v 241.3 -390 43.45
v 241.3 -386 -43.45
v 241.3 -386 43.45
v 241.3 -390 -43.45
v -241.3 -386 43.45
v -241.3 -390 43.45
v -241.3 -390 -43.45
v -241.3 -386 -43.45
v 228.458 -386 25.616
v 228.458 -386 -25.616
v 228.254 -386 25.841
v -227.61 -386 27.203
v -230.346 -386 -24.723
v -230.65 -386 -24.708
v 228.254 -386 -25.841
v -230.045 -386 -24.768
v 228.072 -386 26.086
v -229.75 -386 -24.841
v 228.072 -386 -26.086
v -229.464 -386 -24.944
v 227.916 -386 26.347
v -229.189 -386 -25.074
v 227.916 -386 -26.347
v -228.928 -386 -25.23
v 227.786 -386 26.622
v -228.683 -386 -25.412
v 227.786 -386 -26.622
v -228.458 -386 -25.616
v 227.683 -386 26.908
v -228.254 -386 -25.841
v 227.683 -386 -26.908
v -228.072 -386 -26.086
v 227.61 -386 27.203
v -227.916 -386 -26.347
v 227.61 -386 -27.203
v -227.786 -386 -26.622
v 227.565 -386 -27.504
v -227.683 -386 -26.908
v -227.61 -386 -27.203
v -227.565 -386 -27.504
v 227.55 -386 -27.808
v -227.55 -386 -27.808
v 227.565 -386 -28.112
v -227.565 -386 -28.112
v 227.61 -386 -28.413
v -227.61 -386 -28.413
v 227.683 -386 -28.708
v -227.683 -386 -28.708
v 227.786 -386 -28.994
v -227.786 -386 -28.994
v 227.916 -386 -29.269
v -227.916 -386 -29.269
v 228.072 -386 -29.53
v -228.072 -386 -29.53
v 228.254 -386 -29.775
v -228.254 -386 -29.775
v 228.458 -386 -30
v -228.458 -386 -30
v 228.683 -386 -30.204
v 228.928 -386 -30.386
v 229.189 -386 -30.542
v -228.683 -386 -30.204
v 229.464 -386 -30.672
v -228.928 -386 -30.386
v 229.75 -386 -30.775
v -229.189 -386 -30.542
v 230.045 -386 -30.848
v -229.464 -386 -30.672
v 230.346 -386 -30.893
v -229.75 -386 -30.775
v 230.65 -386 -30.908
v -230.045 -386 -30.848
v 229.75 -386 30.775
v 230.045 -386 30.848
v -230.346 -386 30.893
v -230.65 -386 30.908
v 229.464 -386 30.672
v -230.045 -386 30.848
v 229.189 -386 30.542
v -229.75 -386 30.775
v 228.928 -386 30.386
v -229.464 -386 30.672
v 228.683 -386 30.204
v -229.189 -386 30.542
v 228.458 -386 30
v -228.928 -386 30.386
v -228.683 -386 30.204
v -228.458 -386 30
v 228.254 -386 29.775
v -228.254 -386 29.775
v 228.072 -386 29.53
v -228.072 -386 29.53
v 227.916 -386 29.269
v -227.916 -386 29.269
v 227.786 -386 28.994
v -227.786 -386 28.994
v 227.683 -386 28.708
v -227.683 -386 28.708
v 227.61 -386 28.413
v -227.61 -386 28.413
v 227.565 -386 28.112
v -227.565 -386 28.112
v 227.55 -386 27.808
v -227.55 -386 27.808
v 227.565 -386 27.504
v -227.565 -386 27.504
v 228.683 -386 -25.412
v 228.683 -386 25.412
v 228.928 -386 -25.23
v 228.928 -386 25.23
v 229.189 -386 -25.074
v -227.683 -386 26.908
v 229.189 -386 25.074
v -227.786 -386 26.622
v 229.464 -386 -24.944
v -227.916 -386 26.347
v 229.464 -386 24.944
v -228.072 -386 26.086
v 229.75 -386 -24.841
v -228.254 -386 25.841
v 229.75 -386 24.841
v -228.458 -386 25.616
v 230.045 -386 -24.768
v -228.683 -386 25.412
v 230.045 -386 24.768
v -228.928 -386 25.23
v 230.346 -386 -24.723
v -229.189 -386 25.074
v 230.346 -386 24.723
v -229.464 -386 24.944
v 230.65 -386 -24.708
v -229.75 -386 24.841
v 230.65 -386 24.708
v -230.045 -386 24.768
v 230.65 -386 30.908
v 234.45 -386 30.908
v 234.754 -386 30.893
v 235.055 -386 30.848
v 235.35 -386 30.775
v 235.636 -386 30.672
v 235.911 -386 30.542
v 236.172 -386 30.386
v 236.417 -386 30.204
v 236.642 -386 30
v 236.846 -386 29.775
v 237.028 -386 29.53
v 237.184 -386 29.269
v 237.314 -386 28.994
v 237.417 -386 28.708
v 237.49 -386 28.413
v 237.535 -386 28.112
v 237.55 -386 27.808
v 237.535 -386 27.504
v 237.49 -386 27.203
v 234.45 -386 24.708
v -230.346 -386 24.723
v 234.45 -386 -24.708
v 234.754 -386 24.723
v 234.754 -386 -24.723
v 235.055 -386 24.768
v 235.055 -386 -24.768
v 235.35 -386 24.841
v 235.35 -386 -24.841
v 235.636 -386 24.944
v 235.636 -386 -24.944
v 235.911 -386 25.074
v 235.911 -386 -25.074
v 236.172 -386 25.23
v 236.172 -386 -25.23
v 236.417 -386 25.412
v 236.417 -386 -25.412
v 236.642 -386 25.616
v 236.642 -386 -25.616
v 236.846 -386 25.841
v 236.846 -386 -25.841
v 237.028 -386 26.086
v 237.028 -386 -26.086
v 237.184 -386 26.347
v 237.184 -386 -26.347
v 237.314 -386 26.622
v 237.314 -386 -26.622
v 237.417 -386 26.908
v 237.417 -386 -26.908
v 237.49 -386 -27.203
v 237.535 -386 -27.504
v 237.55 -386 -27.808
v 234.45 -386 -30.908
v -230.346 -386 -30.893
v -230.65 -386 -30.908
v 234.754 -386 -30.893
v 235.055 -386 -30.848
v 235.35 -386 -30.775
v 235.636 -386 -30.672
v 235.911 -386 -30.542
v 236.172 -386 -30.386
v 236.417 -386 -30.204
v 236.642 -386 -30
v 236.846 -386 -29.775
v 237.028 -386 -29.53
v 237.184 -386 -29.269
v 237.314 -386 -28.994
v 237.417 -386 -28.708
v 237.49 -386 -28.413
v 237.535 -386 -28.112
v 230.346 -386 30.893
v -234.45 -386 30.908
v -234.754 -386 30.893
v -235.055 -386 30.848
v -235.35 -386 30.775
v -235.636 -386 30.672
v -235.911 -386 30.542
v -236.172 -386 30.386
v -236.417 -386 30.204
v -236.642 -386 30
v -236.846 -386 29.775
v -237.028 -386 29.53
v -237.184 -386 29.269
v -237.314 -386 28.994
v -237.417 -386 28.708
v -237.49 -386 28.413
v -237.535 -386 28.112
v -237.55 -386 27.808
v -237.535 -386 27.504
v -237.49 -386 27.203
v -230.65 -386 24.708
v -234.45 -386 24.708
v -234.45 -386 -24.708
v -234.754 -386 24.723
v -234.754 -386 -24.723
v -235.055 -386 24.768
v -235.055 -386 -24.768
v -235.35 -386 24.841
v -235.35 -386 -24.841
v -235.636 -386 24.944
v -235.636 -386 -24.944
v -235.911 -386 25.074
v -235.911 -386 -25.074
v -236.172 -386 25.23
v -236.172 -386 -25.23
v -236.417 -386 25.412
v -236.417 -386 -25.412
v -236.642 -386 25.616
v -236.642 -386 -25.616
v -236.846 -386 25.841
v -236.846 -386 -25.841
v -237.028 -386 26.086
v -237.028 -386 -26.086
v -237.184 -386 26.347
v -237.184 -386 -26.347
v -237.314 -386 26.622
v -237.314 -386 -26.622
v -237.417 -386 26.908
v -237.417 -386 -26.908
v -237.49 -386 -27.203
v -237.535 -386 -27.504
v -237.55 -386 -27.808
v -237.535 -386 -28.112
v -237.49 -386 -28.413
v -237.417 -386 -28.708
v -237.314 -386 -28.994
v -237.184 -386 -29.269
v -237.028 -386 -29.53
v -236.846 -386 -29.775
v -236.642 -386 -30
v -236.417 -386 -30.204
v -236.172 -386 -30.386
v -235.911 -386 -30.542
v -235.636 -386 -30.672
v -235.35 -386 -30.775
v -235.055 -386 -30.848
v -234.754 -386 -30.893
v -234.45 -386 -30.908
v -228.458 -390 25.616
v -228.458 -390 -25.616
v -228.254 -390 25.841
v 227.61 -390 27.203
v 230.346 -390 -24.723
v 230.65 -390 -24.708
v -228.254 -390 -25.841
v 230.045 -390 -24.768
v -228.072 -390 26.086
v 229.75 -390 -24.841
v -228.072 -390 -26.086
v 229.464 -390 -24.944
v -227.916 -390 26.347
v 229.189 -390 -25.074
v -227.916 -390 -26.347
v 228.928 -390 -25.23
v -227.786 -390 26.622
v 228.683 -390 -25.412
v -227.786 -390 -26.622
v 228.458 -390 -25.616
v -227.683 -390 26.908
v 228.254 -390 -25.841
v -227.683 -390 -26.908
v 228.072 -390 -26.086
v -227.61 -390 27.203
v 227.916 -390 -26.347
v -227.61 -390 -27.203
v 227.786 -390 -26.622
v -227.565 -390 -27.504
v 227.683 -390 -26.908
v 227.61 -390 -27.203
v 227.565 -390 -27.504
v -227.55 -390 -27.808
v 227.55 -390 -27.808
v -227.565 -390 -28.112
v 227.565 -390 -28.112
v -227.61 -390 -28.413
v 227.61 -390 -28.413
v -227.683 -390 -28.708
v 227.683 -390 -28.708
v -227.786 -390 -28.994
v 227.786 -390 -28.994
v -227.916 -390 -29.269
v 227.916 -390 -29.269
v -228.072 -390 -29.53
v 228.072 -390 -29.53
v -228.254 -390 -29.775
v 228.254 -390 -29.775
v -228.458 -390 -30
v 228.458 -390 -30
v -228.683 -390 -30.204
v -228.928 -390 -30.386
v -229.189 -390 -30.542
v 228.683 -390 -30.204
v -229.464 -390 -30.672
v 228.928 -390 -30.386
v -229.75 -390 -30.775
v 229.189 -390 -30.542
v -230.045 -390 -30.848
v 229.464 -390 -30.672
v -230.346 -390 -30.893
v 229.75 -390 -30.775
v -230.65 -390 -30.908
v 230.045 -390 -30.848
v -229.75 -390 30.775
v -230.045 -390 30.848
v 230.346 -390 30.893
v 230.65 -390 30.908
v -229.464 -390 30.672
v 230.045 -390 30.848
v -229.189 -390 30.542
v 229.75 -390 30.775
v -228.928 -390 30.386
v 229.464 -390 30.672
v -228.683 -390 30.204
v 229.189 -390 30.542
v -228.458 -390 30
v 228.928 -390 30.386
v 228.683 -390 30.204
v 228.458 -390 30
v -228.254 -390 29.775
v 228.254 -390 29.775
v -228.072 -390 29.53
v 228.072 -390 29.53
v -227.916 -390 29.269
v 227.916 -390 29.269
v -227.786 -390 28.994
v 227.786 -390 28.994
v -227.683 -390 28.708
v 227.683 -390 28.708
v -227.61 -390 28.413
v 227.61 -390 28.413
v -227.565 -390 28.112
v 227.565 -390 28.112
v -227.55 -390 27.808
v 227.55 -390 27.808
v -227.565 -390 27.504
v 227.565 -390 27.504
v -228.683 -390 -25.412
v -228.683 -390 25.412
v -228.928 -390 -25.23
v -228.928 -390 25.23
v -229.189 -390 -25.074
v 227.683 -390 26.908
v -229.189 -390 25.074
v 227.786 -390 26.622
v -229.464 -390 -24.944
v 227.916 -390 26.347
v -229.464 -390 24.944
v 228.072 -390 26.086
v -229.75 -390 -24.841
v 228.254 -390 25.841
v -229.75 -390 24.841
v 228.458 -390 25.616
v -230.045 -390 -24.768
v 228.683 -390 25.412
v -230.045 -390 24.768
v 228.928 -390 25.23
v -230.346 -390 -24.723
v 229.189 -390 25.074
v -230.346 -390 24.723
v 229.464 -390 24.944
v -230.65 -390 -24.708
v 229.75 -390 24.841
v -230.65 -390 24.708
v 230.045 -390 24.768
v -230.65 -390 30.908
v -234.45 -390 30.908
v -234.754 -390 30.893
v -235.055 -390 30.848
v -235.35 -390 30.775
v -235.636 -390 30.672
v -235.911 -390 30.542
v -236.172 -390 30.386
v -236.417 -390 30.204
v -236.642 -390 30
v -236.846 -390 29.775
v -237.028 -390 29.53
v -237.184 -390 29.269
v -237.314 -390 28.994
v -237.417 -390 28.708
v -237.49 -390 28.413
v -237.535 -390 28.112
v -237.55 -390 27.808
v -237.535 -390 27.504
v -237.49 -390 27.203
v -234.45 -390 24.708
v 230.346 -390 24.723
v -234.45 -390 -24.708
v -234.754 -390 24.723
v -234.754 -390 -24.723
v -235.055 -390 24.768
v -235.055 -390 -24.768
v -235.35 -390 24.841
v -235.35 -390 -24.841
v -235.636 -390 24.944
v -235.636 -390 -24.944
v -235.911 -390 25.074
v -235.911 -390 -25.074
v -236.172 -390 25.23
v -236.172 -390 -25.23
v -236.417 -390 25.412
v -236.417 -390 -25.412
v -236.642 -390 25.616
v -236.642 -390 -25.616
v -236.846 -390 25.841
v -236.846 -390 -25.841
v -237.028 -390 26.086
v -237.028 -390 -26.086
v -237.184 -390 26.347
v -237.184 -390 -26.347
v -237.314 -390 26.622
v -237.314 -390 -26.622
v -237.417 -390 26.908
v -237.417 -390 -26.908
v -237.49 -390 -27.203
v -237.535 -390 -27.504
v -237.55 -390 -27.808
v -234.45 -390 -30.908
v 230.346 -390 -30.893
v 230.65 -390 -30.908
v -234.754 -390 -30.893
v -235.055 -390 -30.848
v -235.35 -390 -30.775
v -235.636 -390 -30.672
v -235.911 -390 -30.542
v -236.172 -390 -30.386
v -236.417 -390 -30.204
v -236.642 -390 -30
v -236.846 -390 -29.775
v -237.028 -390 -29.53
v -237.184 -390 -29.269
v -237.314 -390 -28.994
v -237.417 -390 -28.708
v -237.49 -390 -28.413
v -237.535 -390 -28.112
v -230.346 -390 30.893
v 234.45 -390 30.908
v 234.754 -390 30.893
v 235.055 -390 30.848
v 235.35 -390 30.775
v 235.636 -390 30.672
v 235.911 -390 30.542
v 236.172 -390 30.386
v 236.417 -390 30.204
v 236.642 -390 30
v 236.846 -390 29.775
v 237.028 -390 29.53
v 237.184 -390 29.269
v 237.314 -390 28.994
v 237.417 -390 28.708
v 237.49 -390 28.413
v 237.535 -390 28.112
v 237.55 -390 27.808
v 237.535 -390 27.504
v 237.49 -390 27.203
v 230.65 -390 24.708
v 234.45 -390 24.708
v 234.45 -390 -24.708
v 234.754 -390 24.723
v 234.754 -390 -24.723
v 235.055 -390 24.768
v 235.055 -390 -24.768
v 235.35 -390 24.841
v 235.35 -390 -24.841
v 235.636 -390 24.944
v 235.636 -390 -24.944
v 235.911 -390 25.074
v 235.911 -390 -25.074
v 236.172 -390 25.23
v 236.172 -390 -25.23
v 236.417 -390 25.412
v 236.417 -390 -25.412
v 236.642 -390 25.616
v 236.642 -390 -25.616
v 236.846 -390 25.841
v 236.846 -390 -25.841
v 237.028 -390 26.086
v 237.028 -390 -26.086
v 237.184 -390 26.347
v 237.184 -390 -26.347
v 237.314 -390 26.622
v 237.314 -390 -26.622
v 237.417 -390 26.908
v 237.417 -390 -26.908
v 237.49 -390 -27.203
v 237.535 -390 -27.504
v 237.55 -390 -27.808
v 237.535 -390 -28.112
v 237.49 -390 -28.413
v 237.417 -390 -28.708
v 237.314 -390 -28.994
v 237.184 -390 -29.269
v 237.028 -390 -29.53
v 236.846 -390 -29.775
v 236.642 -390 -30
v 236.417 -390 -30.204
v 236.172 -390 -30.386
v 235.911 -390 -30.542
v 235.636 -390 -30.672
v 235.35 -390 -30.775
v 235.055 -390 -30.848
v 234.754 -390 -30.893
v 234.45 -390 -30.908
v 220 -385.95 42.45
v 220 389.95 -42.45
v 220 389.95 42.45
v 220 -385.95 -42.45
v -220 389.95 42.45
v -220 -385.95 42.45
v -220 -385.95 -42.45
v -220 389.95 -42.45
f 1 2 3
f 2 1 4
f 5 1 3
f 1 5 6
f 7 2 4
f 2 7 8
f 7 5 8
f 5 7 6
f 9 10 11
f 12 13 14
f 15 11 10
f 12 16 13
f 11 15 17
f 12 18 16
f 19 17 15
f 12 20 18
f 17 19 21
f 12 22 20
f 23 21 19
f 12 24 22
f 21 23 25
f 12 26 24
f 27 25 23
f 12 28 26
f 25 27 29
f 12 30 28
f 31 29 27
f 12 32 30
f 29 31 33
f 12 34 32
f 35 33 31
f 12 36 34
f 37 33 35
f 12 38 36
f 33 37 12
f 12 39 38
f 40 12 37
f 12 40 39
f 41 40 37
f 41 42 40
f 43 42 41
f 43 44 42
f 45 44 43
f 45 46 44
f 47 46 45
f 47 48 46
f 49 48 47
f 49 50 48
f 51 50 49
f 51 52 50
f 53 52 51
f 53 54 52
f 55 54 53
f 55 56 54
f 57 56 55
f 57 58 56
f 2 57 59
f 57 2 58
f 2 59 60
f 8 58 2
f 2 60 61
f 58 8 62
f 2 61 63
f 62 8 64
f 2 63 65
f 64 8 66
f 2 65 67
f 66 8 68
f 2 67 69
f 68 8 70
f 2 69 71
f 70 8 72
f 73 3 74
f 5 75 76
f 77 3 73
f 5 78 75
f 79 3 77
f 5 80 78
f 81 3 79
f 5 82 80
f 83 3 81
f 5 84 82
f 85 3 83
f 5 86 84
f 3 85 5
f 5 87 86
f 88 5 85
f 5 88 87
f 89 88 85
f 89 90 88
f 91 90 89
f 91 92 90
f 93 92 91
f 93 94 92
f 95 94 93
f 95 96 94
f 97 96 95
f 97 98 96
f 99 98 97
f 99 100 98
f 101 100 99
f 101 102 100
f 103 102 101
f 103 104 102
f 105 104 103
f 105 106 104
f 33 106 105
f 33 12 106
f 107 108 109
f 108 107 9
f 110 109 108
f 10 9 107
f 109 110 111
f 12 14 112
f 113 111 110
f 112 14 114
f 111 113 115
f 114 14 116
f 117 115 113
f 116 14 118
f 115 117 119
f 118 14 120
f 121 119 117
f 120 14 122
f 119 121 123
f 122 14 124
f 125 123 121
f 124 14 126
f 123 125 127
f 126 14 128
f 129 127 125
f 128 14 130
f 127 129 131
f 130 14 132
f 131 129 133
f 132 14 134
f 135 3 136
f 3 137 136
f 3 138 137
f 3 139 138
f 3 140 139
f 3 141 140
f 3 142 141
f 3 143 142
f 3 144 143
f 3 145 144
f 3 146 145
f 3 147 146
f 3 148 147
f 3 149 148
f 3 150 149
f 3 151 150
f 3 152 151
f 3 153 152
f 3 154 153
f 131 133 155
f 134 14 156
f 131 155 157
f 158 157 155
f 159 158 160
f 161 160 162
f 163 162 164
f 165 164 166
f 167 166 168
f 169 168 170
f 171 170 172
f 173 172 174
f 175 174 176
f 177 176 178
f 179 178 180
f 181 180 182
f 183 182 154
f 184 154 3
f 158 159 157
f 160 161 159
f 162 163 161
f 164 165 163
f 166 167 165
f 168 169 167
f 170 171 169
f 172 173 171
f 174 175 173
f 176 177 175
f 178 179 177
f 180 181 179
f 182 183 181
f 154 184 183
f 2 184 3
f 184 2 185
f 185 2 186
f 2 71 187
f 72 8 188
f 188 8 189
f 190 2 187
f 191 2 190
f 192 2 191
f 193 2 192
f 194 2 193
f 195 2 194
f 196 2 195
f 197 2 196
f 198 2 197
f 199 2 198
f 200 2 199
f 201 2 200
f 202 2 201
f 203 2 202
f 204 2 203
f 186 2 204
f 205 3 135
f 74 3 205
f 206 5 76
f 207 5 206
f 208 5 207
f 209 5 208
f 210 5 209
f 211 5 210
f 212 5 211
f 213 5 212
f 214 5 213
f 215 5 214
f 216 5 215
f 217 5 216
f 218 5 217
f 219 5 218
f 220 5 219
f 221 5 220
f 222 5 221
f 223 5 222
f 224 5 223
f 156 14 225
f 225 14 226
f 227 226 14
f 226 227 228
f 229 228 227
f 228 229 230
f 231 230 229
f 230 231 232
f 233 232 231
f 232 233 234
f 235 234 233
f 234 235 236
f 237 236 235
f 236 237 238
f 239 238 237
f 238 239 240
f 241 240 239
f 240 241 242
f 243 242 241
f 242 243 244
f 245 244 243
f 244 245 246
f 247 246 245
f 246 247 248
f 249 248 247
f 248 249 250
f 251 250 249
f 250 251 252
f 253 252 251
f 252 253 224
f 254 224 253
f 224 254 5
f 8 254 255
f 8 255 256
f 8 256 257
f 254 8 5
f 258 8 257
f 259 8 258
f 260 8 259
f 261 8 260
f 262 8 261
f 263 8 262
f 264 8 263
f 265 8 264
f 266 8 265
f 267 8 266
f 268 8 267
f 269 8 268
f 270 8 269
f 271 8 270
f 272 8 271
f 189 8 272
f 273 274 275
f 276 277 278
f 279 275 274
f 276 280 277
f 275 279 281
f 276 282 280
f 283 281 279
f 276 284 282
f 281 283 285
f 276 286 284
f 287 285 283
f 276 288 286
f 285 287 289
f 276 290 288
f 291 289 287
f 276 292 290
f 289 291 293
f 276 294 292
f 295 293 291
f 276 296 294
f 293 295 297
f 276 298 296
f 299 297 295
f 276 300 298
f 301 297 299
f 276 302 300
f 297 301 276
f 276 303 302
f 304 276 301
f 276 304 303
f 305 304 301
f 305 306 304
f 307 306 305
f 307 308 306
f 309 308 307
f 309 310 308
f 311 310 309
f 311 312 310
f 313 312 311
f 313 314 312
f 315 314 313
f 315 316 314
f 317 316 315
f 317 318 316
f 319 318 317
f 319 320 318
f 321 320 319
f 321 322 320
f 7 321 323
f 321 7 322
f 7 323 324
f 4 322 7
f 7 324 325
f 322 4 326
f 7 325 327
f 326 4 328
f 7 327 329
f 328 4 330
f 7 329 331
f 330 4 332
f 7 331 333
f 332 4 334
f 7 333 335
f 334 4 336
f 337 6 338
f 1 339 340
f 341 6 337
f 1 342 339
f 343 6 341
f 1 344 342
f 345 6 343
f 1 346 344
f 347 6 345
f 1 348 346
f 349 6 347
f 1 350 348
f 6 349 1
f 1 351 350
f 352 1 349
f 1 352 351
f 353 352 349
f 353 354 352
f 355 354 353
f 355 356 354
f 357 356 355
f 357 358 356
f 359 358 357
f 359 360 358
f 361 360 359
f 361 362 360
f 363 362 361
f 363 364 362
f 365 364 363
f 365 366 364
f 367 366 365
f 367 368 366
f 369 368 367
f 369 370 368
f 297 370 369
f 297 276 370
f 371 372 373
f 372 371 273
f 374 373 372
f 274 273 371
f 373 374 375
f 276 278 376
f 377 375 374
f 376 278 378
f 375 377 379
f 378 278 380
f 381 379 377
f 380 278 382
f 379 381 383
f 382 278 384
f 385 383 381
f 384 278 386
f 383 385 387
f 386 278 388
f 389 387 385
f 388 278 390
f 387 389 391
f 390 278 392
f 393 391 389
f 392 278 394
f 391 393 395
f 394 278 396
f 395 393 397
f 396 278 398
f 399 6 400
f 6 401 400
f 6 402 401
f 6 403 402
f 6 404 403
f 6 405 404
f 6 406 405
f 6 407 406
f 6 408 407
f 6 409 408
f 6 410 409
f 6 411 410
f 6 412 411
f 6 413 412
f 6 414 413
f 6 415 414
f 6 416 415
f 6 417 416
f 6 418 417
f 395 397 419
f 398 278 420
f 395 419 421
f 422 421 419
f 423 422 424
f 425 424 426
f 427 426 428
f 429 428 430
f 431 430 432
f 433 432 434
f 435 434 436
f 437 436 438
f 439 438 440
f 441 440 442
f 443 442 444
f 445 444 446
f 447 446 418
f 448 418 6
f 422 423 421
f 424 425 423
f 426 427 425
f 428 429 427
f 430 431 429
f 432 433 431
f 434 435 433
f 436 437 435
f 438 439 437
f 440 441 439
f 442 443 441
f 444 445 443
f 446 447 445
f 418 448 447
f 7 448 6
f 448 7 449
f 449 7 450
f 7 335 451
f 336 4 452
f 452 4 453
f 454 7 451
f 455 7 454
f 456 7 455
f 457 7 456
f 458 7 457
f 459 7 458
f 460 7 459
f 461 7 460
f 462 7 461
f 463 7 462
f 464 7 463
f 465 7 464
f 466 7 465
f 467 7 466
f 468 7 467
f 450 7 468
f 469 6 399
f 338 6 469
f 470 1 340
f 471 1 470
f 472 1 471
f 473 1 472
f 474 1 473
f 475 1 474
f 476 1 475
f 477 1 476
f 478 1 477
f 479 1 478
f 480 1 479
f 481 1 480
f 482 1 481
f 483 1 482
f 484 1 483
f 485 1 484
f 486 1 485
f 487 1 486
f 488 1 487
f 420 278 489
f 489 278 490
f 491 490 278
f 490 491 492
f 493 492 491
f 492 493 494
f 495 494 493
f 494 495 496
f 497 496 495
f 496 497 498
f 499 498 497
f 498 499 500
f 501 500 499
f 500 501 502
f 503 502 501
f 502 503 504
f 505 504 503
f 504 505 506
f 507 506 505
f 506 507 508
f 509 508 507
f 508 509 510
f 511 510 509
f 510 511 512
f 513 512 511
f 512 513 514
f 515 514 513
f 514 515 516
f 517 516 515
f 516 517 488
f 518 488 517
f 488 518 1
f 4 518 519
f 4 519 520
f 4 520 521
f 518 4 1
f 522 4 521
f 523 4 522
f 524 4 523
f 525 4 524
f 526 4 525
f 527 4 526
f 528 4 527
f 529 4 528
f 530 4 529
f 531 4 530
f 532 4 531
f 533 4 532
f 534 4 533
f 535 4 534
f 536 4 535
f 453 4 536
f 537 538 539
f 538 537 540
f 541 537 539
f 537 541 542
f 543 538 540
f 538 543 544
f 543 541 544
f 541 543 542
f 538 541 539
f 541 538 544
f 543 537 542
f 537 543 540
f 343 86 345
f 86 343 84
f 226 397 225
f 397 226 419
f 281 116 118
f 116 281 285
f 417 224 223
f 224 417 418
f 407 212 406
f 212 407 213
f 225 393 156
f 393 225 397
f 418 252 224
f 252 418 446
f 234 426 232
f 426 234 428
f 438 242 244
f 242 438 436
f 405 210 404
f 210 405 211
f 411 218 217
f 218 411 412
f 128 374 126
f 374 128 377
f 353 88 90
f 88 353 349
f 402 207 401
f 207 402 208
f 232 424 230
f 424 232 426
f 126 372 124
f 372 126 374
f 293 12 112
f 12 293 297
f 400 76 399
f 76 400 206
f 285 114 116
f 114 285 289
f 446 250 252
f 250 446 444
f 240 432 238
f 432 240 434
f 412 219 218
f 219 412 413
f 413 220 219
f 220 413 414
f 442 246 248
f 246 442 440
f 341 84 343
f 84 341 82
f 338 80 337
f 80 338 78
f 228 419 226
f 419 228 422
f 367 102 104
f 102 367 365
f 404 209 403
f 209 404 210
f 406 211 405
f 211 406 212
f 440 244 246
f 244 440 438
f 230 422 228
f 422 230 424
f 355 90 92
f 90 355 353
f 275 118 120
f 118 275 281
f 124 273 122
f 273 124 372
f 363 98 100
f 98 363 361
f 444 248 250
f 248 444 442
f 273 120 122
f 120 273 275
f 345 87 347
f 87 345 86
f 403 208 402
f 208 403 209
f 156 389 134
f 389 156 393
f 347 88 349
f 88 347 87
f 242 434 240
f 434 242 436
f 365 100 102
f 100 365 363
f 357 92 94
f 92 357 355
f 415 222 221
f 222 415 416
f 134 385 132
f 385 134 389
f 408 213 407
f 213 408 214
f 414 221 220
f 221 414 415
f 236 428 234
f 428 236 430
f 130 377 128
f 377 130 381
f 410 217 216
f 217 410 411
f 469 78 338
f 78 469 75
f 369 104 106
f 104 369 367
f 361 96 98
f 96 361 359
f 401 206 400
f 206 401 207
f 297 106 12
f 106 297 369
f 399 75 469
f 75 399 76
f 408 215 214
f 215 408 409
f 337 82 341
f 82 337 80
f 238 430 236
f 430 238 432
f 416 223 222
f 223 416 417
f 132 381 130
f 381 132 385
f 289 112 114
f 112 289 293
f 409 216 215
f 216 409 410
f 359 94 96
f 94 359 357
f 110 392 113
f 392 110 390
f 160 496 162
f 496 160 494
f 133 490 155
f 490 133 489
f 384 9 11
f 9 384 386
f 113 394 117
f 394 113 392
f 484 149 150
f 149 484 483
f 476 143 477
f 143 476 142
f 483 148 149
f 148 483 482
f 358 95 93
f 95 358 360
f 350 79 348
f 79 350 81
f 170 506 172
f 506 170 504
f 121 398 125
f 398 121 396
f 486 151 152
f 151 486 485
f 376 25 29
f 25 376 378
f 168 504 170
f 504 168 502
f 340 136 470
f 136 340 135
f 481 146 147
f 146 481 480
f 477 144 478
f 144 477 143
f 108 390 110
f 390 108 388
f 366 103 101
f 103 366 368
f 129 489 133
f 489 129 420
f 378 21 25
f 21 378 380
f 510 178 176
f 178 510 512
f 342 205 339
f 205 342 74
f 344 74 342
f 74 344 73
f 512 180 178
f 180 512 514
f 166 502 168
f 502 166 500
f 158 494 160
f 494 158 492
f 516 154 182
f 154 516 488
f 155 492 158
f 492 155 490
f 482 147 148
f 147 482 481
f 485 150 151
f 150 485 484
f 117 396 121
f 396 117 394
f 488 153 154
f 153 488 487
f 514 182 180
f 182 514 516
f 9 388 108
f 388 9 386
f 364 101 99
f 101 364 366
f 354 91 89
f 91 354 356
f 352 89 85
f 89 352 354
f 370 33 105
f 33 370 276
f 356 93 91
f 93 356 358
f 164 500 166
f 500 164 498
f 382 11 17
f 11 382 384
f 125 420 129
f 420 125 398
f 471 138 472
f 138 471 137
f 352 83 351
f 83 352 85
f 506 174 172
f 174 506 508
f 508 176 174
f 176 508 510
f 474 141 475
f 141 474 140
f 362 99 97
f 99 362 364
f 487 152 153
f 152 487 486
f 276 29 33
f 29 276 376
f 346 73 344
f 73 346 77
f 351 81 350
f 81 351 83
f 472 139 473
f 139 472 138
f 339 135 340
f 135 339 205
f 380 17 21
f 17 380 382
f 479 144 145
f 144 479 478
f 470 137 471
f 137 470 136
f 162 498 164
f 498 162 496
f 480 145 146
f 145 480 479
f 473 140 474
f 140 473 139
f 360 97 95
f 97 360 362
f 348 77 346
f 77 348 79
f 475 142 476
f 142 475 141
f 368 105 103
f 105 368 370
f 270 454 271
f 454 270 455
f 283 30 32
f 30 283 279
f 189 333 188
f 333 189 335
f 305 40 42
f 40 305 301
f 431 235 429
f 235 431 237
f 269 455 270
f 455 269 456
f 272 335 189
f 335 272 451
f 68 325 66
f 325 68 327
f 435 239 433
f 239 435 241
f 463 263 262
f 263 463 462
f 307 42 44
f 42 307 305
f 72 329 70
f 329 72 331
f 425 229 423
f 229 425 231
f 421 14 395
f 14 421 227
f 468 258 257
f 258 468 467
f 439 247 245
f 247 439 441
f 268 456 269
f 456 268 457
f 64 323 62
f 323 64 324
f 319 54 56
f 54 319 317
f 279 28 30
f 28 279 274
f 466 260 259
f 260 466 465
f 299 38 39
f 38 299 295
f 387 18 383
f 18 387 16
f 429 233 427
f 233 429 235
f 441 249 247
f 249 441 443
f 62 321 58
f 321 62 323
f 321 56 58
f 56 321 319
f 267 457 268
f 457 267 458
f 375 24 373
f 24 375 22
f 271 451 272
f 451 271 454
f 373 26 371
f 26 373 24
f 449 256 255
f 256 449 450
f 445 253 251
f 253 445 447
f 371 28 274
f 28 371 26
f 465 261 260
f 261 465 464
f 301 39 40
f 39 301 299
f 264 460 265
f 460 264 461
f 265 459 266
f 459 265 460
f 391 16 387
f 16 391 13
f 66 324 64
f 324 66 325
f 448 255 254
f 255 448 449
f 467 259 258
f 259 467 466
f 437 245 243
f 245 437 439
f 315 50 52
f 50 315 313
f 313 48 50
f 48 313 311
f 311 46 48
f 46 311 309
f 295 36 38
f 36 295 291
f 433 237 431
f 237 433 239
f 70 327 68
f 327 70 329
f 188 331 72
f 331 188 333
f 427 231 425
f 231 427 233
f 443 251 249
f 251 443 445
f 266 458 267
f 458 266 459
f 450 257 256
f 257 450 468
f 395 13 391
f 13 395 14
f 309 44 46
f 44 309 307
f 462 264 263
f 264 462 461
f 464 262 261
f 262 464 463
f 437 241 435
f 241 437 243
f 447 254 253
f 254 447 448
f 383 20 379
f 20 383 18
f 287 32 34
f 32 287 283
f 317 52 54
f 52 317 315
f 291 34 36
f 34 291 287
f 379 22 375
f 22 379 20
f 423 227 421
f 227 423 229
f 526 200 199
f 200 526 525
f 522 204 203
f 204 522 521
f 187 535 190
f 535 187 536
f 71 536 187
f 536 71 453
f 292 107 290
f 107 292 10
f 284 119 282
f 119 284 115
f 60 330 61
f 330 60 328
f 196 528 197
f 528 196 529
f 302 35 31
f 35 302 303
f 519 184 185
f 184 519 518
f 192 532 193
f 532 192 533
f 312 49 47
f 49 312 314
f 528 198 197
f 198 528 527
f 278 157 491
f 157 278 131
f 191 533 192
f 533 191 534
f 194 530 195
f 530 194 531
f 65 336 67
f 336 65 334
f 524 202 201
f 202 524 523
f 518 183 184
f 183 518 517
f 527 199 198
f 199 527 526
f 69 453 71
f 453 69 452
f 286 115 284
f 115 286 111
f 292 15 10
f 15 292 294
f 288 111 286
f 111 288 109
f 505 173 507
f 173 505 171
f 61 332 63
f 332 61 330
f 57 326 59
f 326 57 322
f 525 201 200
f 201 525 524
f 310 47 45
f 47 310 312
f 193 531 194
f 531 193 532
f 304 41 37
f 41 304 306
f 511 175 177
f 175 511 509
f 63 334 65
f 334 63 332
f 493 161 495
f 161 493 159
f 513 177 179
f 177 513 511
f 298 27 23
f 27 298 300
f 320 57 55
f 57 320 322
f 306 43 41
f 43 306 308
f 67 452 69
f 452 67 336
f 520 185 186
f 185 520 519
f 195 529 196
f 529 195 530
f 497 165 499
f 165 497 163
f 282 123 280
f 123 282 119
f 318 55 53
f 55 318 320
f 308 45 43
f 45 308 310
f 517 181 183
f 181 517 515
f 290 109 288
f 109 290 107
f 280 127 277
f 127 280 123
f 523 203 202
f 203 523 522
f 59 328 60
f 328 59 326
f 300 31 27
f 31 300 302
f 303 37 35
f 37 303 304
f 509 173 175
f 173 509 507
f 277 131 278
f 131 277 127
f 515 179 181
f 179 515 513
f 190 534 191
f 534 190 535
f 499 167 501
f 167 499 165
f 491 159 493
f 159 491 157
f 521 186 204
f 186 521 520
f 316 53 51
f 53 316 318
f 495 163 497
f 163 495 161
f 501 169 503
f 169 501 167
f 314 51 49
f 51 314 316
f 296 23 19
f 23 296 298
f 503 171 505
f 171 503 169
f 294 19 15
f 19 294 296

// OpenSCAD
// ============================================================================
// Atom Lithography Machine — Parametric OpenSCAD Module (S9.HPC-01)
// ============================================================================
// part_id           : S9.HPC-01
// parent_bom_id     : S9.HPC
// subsystem         : S9
// part_name         : 2U Cift-Hizlandiricili QEC Dekoder Dugumu (2x H100/Alveo-U280 Sinifi + Cift-100G ConnectX-7 RoCEv2 NIC, Exp143, 56.00 kg)
// material          : Steel
// temp_stage        : 300 K (HPC rafi)
// vacuum_grade      : Atmosfer
// tolerance         : <6.7 us d=37 / <2.6 us qLDPC
// computed_mass_kg  : 56.00000
// envelope_mm       : 482.600 x 818.400 x 177.900
// design_maturity   : M0_M1_DETAILED_CAD_DESIGN_ONLY
// no_lab_measurement: true
// iec61508_certified: false
// semi_s2_certified : false
// Units: millimeters (mm)
// ============================================================================

$fn = 64;

// Nominal bounding envelope parameters (mm)
bbox_x = 482.6000;
bbox_y = 818.4000;
bbox_z = 177.9000;

// Part-specific parametric dimensions
qty_nodes = 2;
u_per_node = 2;
depth_mm = 780.0;
power_W = 2100;

// Interface / port parameters (mm)

module part_S9_HPC_01() {
  difference() {
    union() {
      // 19-inch EIA-310 front faceplate
      translate([0.000, -388.000, 0.000]) cube([482.600, 4.000, 86.900], center=true);
      // Main rack chassis enclosure
      translate([0.000, 2.000, 0.000]) cube([440.000, 775.900, 84.900], center=true);
    }
    // EIA-310 rack ear mounting slot (top-left)
    translate([-232.550, -388.000, 27.808]) rotate([90.000, 0.000, 0.000]) {
      hull() {
        translate([-1.900, 0, 0]) cylinder(d=6.200, h=8.000, center=true);
        translate([1.900, 0, 0]) cylinder(d=6.200, h=8.000, center=true);
      }
    }
    // EIA-310 rack ear mounting slot (top-right)
    translate([232.550, -388.000, 27.808]) rotate([90.000, 0.000, 0.000]) {
      hull() {
        translate([-1.900, 0, 0]) cylinder(d=6.200, h=8.000, center=true);
        translate([1.900, 0, 0]) cylinder(d=6.200, h=8.000, center=true);
      }
    }
    // EIA-310 rack ear mounting slot (bottom-left)
    translate([-232.550, -388.000, -27.808]) rotate([90.000, 0.000, 0.000]) {
      hull() {
        translate([-1.900, 0, 0]) cylinder(d=6.200, h=8.000, center=true);
        translate([1.900, 0, 0]) cylinder(d=6.200, h=8.000, center=true);
      }
    }
    // EIA-310 rack ear mounting slot (bottom-right)
    translate([232.550, -388.000, -27.808]) rotate([90.000, 0.000, 0.000]) {
      hull() {
        translate([-1.900, 0, 0]) cylinder(d=6.200, h=8.000, center=true);
        translate([1.900, 0, 0]) cylinder(d=6.200, h=8.000, center=true);
      }
    }
  }
}

// World assembly mounting transform (global machine frame, mm / deg):
// translate([2750.000, -700.000, 174.250]) rotate([0.000, 0.000, 0.000]) part_S9_HPC_01();

part_S9_HPC_01();
